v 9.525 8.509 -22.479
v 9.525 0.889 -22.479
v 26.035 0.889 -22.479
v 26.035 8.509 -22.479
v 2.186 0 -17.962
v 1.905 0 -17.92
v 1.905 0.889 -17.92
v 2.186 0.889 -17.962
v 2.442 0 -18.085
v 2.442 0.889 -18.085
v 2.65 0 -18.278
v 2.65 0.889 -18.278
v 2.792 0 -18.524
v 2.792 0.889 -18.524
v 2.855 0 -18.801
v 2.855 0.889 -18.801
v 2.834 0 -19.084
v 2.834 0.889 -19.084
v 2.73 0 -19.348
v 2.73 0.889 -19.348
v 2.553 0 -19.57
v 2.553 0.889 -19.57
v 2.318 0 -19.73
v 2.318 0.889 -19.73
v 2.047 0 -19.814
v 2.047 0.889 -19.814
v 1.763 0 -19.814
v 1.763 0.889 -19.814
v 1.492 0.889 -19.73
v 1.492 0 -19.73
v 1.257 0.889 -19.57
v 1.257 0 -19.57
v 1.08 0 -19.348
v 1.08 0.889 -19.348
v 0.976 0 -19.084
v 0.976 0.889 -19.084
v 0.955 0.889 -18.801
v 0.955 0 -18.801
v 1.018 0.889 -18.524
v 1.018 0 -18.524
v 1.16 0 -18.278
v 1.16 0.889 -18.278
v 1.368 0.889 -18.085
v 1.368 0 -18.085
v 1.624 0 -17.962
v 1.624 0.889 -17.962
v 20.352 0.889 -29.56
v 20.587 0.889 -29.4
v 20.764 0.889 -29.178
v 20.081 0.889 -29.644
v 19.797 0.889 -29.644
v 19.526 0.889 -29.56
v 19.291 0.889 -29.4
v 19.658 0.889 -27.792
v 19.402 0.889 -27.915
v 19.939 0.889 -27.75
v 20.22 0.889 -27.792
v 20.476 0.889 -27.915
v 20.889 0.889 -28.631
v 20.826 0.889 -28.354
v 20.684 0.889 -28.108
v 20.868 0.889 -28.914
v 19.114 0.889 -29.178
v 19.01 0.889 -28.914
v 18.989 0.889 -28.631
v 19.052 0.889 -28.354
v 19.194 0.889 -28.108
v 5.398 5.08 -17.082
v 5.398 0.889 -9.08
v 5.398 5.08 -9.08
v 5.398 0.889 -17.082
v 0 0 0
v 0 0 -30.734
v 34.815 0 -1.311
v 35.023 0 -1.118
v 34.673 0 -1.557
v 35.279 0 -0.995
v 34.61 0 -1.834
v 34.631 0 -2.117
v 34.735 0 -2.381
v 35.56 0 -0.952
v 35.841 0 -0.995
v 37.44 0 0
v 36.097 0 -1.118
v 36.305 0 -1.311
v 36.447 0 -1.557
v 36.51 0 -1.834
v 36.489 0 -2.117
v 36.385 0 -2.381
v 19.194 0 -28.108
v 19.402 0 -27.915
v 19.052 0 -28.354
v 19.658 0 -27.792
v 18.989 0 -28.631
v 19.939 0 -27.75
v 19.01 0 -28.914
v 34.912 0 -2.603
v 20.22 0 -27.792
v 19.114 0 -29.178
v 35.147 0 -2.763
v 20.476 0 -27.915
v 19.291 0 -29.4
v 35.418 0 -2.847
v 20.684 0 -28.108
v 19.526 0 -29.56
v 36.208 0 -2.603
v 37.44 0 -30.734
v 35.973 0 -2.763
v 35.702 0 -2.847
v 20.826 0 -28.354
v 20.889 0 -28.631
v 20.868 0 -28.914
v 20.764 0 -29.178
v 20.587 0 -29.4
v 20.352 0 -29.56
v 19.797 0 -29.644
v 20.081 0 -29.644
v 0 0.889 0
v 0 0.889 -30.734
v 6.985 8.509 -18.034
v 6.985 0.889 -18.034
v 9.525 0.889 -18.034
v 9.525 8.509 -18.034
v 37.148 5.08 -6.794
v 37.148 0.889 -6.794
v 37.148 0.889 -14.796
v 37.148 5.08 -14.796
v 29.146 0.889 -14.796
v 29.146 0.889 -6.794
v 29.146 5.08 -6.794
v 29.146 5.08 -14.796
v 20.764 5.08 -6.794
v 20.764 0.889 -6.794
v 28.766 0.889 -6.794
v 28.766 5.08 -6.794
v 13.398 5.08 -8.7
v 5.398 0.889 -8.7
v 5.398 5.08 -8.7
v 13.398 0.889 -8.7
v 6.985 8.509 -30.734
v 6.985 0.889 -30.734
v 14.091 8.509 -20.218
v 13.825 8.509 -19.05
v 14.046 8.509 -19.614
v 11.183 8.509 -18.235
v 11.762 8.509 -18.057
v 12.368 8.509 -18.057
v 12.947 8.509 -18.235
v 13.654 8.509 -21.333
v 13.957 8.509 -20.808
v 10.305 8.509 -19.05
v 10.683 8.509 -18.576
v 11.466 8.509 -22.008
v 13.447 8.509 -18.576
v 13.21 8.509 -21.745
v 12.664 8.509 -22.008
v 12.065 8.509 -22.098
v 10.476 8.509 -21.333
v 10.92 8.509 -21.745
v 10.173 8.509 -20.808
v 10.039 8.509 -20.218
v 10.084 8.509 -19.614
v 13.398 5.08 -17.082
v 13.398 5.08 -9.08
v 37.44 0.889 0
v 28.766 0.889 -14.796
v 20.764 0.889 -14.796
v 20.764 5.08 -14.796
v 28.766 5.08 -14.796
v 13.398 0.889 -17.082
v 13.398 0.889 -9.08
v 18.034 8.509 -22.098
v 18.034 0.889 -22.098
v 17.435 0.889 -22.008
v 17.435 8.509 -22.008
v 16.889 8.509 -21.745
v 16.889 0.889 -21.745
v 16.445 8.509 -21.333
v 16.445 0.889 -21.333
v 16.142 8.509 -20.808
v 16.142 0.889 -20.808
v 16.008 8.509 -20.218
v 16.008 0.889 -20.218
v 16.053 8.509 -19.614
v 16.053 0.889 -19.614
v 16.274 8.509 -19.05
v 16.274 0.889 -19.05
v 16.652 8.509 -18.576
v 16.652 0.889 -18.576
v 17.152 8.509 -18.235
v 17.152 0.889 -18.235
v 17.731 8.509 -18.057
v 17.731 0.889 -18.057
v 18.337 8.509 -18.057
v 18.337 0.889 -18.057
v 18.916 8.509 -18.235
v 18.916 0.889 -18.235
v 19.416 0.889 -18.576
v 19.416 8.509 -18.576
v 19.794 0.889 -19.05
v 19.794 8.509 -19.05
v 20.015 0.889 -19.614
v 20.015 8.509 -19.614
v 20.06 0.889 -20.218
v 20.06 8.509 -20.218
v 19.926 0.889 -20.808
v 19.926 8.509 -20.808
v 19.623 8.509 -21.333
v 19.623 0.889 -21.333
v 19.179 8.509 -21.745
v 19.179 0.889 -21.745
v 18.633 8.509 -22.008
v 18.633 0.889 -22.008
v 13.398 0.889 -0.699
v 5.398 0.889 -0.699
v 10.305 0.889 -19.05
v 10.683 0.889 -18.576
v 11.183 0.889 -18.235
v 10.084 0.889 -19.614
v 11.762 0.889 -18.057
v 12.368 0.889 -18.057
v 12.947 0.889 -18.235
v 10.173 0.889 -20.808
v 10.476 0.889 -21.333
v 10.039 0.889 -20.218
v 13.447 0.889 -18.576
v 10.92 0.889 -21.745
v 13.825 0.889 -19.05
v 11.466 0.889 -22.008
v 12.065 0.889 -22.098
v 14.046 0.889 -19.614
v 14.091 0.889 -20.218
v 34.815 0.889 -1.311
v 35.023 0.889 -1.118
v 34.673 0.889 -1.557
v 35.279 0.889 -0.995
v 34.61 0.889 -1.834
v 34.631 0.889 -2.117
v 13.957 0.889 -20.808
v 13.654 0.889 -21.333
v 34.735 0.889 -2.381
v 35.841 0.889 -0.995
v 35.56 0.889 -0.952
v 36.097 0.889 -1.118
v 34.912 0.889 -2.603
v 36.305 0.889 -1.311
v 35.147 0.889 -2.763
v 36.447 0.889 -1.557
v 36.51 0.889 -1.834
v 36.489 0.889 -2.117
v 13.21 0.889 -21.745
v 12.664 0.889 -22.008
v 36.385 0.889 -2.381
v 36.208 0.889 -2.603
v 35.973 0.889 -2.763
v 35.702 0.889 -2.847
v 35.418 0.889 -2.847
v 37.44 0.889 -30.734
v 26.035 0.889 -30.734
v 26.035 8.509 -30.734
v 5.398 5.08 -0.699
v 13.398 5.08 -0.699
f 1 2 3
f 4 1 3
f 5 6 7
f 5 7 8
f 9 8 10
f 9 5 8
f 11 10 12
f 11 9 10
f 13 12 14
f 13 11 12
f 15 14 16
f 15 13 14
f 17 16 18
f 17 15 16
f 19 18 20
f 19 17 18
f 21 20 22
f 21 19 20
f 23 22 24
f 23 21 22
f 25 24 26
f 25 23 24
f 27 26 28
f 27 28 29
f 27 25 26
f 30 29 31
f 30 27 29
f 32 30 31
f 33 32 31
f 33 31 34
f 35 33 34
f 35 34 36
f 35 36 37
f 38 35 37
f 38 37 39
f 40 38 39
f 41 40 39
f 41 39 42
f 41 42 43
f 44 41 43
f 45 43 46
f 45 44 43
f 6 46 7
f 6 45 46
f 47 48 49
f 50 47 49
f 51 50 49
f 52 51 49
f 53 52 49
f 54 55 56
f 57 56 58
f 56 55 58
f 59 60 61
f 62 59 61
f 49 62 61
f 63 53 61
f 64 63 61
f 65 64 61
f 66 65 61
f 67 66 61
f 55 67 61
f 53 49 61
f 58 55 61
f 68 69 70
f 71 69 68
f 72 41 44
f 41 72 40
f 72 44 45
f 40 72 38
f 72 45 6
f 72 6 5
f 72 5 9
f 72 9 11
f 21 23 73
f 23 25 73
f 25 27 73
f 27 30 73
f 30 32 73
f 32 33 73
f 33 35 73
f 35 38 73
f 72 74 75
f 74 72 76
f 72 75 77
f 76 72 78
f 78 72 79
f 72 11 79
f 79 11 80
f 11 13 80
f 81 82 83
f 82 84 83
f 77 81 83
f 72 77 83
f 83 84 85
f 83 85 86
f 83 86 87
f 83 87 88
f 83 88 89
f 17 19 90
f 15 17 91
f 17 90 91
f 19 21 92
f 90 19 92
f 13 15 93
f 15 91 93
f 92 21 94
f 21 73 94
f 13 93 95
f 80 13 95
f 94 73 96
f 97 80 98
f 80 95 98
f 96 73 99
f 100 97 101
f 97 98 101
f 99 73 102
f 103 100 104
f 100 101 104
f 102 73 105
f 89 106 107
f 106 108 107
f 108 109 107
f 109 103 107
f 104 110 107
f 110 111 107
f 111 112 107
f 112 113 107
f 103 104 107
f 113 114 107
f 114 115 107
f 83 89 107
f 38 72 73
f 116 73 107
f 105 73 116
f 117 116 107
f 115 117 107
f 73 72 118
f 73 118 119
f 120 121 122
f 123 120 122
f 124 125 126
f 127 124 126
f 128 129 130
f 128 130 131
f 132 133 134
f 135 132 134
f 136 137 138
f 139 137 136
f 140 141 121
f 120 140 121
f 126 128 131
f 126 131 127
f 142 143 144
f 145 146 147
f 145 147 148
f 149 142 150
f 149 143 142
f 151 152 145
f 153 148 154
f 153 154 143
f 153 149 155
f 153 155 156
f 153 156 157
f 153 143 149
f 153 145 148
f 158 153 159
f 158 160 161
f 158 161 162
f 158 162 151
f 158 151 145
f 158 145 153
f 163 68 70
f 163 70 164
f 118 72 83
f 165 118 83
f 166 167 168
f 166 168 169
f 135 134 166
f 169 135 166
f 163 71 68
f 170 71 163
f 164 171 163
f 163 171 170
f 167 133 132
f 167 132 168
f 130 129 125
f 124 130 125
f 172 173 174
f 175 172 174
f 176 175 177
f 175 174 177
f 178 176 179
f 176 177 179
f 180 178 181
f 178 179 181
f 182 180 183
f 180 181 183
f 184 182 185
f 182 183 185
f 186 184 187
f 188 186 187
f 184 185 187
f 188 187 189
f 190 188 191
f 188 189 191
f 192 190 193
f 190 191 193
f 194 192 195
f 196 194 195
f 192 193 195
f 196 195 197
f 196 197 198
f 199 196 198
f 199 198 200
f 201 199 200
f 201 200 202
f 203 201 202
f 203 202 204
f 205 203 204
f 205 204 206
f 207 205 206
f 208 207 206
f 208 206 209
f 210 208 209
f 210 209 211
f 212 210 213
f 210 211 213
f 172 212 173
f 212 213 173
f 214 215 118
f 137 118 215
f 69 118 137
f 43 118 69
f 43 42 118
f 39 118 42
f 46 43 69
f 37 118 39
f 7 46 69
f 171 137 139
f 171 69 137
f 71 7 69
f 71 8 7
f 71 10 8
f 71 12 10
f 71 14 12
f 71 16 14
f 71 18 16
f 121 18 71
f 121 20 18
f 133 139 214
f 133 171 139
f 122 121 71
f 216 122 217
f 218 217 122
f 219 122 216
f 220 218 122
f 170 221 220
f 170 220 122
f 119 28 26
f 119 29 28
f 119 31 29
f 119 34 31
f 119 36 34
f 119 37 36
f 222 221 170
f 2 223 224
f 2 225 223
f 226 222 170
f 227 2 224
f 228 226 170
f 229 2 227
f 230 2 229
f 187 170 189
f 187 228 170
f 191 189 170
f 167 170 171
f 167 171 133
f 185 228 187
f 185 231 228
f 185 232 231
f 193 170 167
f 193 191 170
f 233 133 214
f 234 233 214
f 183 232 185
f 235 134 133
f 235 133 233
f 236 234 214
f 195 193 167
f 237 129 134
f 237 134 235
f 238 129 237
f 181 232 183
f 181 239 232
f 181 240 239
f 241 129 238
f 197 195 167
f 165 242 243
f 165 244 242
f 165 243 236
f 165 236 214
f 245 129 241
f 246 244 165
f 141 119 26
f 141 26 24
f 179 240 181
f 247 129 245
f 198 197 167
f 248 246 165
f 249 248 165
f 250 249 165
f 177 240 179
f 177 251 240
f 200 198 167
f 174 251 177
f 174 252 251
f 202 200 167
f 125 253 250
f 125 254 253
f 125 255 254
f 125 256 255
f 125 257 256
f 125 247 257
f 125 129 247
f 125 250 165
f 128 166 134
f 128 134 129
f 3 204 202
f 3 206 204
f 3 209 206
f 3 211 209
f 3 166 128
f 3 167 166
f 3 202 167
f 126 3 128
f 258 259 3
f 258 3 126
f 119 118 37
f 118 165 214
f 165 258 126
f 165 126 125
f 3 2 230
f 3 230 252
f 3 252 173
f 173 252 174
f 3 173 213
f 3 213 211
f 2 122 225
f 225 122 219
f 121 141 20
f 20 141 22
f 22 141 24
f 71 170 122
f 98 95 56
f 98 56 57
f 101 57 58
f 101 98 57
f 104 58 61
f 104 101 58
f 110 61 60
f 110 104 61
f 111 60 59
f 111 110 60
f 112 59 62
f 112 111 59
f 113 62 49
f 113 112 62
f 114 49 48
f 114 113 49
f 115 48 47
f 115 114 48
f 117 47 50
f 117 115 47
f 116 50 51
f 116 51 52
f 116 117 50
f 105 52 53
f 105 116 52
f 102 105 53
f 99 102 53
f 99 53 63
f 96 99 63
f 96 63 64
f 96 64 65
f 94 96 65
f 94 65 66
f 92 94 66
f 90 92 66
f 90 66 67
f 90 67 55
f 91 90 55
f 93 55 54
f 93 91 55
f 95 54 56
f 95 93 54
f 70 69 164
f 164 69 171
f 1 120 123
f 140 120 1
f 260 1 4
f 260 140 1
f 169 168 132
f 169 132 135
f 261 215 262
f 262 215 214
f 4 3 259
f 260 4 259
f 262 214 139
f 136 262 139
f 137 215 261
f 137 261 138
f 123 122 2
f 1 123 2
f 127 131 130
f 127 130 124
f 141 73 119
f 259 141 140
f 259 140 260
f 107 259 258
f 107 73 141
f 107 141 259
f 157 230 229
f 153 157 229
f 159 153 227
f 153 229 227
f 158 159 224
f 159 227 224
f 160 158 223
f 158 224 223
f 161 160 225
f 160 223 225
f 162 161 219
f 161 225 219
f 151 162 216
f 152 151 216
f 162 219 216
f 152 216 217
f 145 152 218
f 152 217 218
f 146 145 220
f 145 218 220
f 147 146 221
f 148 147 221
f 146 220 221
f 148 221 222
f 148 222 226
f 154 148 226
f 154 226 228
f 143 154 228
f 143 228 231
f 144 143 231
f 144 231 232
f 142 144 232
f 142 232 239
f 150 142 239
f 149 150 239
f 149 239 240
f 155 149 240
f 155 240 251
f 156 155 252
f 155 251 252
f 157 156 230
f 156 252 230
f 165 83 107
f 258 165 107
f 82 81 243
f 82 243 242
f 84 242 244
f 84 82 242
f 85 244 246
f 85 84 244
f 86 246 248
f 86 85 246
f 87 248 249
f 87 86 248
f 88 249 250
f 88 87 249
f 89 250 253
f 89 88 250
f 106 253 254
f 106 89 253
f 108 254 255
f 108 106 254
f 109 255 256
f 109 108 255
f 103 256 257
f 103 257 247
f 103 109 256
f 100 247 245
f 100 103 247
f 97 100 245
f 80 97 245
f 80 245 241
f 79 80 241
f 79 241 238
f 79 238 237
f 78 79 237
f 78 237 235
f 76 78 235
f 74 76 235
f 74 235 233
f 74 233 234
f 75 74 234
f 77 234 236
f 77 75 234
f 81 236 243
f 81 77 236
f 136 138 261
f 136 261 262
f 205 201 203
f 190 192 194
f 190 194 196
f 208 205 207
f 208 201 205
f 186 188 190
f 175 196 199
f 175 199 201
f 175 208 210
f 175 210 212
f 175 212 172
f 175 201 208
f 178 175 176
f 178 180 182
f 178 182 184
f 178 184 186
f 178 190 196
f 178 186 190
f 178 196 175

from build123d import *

# Parameters (mm, degrees)
SKETCH1_W           = 37.4396
SKETCH1_H           = 30.734
SKETCH1_R           = 0.9525
BOSS_EXTRUDE1_DEPTH = 0.889
SKETCH2_R           = 2.032
BOSS_EXTRUDE2_DEPTH = 7.62
SKETCH3_W           = 16.51
SKETCH3_H           = 8.255
SKETCH3_R           = 0.9525
BOSS_EXTRUDE4_DEPTH = 7.62
SKETCH4_W           = 8.001
SKETCH4_H           = 8.001
BOSS_EXTRUDE5_DEPTH = 4.191


with BuildPart() as part:
    # Sketch1 → Boss-Extrude1 (new body)
    with BuildSketch(Plane(origin=(0, 0, 0), x_dir=(1, 0, 0), z_dir=(0, 1, 0))):
        with Locations((18.7198, 15.367)):
            Rectangle(SKETCH1_W, SKETCH1_H)
        with Locations(Location((19.939, 28.702, 0), (0, 0, 270))):
            Circle(SKETCH1_R, mode=Mode.SUBTRACT)
        with Locations(Location((35.56, 1.905, 0), (0, 0, 270))):
            Circle(SKETCH1_R, mode=Mode.SUBTRACT)
        with Locations(Location((1.905, 18.8722, 0), (0, 0, 270))):
            Circle(SKETCH1_R, mode=Mode.SUBTRACT)
    extrude(amount=BOSS_EXTRUDE1_DEPTH)

    # Sketch2 → Boss-Extrude2 (add)
    with BuildSketch(Plane(origin=(0, 0.889, 0), x_dir=(1, 0, 0), z_dir=(0, 1, 0))):
        with Locations(Location((12.065, 20.066, 0), (0, 0, 90))):
            Circle(SKETCH2_R)
        with Locations(Location((18.034, 20.066, 0), (0, 0, 90))):
            Circle(SKETCH2_R)
    extrude(amount=BOSS_EXTRUDE2_DEPTH)

    # Sketch3 → Boss-Extrude4 (add)
    # profile 1 of 3: a face of its own
    with BuildSketch(Plane(origin=(0, 0.889, 0), x_dir=(1, 0, 0), z_dir=(0, 1, 0))):
        with Locations((17.78, 26.6065)):
            Rectangle(SKETCH3_W, SKETCH3_H)
        with Locations(Location((19.939, 28.702, 0), (0, 0, 270))):
            Circle(SKETCH3_R, mode=Mode.SUBTRACT)
    # profile 2 of 3: a face of its own
    with BuildSketch(Plane(origin=(0, 0.889, 0), x_dir=(1, 0, 0), z_dir=(0, 1, 0))):
        with Locations(Location((19.939, 28.702, 0), (0, 0, 270))):
            Circle(SKETCH3_R)
    # profile 3 of 3: a face of its own
    with BuildSketch(Plane(origin=(0, 0.889, 0), x_dir=(1, 0, 0), z_dir=(0, 1, 0))):
        Polygon((6.985, 30.734), (6.985, 18.034), (9.525, 18.034), (9.525, 22.479), (9.525, 30.734), align=None)
    extrude(amount=BOSS_EXTRUDE4_DEPTH)

    # Sketch4 → Boss-Extrude5 (add)
    with BuildSketch(Plane(origin=(0, 0.889, 0), x_dir=(1, 0, 0), z_dir=(0, 1, 0))):
        with Locations((24.765, 10.795)):
            Rectangle(SKETCH4_W, SKETCH4_H)
        with Locations((33.147, 10.795)):
            Rectangle(SKETCH4_W, SKETCH4_H)
        with Locations((9.398, 4.699)):
            Rectangle(SKETCH4_W, SKETCH4_H)
        with Locations((9.398, 13.081)):
            Rectangle(SKETCH4_W, SKETCH4_H)
    extrude(amount=BOSS_EXTRUDE5_DEPTH)


solid = part.part
